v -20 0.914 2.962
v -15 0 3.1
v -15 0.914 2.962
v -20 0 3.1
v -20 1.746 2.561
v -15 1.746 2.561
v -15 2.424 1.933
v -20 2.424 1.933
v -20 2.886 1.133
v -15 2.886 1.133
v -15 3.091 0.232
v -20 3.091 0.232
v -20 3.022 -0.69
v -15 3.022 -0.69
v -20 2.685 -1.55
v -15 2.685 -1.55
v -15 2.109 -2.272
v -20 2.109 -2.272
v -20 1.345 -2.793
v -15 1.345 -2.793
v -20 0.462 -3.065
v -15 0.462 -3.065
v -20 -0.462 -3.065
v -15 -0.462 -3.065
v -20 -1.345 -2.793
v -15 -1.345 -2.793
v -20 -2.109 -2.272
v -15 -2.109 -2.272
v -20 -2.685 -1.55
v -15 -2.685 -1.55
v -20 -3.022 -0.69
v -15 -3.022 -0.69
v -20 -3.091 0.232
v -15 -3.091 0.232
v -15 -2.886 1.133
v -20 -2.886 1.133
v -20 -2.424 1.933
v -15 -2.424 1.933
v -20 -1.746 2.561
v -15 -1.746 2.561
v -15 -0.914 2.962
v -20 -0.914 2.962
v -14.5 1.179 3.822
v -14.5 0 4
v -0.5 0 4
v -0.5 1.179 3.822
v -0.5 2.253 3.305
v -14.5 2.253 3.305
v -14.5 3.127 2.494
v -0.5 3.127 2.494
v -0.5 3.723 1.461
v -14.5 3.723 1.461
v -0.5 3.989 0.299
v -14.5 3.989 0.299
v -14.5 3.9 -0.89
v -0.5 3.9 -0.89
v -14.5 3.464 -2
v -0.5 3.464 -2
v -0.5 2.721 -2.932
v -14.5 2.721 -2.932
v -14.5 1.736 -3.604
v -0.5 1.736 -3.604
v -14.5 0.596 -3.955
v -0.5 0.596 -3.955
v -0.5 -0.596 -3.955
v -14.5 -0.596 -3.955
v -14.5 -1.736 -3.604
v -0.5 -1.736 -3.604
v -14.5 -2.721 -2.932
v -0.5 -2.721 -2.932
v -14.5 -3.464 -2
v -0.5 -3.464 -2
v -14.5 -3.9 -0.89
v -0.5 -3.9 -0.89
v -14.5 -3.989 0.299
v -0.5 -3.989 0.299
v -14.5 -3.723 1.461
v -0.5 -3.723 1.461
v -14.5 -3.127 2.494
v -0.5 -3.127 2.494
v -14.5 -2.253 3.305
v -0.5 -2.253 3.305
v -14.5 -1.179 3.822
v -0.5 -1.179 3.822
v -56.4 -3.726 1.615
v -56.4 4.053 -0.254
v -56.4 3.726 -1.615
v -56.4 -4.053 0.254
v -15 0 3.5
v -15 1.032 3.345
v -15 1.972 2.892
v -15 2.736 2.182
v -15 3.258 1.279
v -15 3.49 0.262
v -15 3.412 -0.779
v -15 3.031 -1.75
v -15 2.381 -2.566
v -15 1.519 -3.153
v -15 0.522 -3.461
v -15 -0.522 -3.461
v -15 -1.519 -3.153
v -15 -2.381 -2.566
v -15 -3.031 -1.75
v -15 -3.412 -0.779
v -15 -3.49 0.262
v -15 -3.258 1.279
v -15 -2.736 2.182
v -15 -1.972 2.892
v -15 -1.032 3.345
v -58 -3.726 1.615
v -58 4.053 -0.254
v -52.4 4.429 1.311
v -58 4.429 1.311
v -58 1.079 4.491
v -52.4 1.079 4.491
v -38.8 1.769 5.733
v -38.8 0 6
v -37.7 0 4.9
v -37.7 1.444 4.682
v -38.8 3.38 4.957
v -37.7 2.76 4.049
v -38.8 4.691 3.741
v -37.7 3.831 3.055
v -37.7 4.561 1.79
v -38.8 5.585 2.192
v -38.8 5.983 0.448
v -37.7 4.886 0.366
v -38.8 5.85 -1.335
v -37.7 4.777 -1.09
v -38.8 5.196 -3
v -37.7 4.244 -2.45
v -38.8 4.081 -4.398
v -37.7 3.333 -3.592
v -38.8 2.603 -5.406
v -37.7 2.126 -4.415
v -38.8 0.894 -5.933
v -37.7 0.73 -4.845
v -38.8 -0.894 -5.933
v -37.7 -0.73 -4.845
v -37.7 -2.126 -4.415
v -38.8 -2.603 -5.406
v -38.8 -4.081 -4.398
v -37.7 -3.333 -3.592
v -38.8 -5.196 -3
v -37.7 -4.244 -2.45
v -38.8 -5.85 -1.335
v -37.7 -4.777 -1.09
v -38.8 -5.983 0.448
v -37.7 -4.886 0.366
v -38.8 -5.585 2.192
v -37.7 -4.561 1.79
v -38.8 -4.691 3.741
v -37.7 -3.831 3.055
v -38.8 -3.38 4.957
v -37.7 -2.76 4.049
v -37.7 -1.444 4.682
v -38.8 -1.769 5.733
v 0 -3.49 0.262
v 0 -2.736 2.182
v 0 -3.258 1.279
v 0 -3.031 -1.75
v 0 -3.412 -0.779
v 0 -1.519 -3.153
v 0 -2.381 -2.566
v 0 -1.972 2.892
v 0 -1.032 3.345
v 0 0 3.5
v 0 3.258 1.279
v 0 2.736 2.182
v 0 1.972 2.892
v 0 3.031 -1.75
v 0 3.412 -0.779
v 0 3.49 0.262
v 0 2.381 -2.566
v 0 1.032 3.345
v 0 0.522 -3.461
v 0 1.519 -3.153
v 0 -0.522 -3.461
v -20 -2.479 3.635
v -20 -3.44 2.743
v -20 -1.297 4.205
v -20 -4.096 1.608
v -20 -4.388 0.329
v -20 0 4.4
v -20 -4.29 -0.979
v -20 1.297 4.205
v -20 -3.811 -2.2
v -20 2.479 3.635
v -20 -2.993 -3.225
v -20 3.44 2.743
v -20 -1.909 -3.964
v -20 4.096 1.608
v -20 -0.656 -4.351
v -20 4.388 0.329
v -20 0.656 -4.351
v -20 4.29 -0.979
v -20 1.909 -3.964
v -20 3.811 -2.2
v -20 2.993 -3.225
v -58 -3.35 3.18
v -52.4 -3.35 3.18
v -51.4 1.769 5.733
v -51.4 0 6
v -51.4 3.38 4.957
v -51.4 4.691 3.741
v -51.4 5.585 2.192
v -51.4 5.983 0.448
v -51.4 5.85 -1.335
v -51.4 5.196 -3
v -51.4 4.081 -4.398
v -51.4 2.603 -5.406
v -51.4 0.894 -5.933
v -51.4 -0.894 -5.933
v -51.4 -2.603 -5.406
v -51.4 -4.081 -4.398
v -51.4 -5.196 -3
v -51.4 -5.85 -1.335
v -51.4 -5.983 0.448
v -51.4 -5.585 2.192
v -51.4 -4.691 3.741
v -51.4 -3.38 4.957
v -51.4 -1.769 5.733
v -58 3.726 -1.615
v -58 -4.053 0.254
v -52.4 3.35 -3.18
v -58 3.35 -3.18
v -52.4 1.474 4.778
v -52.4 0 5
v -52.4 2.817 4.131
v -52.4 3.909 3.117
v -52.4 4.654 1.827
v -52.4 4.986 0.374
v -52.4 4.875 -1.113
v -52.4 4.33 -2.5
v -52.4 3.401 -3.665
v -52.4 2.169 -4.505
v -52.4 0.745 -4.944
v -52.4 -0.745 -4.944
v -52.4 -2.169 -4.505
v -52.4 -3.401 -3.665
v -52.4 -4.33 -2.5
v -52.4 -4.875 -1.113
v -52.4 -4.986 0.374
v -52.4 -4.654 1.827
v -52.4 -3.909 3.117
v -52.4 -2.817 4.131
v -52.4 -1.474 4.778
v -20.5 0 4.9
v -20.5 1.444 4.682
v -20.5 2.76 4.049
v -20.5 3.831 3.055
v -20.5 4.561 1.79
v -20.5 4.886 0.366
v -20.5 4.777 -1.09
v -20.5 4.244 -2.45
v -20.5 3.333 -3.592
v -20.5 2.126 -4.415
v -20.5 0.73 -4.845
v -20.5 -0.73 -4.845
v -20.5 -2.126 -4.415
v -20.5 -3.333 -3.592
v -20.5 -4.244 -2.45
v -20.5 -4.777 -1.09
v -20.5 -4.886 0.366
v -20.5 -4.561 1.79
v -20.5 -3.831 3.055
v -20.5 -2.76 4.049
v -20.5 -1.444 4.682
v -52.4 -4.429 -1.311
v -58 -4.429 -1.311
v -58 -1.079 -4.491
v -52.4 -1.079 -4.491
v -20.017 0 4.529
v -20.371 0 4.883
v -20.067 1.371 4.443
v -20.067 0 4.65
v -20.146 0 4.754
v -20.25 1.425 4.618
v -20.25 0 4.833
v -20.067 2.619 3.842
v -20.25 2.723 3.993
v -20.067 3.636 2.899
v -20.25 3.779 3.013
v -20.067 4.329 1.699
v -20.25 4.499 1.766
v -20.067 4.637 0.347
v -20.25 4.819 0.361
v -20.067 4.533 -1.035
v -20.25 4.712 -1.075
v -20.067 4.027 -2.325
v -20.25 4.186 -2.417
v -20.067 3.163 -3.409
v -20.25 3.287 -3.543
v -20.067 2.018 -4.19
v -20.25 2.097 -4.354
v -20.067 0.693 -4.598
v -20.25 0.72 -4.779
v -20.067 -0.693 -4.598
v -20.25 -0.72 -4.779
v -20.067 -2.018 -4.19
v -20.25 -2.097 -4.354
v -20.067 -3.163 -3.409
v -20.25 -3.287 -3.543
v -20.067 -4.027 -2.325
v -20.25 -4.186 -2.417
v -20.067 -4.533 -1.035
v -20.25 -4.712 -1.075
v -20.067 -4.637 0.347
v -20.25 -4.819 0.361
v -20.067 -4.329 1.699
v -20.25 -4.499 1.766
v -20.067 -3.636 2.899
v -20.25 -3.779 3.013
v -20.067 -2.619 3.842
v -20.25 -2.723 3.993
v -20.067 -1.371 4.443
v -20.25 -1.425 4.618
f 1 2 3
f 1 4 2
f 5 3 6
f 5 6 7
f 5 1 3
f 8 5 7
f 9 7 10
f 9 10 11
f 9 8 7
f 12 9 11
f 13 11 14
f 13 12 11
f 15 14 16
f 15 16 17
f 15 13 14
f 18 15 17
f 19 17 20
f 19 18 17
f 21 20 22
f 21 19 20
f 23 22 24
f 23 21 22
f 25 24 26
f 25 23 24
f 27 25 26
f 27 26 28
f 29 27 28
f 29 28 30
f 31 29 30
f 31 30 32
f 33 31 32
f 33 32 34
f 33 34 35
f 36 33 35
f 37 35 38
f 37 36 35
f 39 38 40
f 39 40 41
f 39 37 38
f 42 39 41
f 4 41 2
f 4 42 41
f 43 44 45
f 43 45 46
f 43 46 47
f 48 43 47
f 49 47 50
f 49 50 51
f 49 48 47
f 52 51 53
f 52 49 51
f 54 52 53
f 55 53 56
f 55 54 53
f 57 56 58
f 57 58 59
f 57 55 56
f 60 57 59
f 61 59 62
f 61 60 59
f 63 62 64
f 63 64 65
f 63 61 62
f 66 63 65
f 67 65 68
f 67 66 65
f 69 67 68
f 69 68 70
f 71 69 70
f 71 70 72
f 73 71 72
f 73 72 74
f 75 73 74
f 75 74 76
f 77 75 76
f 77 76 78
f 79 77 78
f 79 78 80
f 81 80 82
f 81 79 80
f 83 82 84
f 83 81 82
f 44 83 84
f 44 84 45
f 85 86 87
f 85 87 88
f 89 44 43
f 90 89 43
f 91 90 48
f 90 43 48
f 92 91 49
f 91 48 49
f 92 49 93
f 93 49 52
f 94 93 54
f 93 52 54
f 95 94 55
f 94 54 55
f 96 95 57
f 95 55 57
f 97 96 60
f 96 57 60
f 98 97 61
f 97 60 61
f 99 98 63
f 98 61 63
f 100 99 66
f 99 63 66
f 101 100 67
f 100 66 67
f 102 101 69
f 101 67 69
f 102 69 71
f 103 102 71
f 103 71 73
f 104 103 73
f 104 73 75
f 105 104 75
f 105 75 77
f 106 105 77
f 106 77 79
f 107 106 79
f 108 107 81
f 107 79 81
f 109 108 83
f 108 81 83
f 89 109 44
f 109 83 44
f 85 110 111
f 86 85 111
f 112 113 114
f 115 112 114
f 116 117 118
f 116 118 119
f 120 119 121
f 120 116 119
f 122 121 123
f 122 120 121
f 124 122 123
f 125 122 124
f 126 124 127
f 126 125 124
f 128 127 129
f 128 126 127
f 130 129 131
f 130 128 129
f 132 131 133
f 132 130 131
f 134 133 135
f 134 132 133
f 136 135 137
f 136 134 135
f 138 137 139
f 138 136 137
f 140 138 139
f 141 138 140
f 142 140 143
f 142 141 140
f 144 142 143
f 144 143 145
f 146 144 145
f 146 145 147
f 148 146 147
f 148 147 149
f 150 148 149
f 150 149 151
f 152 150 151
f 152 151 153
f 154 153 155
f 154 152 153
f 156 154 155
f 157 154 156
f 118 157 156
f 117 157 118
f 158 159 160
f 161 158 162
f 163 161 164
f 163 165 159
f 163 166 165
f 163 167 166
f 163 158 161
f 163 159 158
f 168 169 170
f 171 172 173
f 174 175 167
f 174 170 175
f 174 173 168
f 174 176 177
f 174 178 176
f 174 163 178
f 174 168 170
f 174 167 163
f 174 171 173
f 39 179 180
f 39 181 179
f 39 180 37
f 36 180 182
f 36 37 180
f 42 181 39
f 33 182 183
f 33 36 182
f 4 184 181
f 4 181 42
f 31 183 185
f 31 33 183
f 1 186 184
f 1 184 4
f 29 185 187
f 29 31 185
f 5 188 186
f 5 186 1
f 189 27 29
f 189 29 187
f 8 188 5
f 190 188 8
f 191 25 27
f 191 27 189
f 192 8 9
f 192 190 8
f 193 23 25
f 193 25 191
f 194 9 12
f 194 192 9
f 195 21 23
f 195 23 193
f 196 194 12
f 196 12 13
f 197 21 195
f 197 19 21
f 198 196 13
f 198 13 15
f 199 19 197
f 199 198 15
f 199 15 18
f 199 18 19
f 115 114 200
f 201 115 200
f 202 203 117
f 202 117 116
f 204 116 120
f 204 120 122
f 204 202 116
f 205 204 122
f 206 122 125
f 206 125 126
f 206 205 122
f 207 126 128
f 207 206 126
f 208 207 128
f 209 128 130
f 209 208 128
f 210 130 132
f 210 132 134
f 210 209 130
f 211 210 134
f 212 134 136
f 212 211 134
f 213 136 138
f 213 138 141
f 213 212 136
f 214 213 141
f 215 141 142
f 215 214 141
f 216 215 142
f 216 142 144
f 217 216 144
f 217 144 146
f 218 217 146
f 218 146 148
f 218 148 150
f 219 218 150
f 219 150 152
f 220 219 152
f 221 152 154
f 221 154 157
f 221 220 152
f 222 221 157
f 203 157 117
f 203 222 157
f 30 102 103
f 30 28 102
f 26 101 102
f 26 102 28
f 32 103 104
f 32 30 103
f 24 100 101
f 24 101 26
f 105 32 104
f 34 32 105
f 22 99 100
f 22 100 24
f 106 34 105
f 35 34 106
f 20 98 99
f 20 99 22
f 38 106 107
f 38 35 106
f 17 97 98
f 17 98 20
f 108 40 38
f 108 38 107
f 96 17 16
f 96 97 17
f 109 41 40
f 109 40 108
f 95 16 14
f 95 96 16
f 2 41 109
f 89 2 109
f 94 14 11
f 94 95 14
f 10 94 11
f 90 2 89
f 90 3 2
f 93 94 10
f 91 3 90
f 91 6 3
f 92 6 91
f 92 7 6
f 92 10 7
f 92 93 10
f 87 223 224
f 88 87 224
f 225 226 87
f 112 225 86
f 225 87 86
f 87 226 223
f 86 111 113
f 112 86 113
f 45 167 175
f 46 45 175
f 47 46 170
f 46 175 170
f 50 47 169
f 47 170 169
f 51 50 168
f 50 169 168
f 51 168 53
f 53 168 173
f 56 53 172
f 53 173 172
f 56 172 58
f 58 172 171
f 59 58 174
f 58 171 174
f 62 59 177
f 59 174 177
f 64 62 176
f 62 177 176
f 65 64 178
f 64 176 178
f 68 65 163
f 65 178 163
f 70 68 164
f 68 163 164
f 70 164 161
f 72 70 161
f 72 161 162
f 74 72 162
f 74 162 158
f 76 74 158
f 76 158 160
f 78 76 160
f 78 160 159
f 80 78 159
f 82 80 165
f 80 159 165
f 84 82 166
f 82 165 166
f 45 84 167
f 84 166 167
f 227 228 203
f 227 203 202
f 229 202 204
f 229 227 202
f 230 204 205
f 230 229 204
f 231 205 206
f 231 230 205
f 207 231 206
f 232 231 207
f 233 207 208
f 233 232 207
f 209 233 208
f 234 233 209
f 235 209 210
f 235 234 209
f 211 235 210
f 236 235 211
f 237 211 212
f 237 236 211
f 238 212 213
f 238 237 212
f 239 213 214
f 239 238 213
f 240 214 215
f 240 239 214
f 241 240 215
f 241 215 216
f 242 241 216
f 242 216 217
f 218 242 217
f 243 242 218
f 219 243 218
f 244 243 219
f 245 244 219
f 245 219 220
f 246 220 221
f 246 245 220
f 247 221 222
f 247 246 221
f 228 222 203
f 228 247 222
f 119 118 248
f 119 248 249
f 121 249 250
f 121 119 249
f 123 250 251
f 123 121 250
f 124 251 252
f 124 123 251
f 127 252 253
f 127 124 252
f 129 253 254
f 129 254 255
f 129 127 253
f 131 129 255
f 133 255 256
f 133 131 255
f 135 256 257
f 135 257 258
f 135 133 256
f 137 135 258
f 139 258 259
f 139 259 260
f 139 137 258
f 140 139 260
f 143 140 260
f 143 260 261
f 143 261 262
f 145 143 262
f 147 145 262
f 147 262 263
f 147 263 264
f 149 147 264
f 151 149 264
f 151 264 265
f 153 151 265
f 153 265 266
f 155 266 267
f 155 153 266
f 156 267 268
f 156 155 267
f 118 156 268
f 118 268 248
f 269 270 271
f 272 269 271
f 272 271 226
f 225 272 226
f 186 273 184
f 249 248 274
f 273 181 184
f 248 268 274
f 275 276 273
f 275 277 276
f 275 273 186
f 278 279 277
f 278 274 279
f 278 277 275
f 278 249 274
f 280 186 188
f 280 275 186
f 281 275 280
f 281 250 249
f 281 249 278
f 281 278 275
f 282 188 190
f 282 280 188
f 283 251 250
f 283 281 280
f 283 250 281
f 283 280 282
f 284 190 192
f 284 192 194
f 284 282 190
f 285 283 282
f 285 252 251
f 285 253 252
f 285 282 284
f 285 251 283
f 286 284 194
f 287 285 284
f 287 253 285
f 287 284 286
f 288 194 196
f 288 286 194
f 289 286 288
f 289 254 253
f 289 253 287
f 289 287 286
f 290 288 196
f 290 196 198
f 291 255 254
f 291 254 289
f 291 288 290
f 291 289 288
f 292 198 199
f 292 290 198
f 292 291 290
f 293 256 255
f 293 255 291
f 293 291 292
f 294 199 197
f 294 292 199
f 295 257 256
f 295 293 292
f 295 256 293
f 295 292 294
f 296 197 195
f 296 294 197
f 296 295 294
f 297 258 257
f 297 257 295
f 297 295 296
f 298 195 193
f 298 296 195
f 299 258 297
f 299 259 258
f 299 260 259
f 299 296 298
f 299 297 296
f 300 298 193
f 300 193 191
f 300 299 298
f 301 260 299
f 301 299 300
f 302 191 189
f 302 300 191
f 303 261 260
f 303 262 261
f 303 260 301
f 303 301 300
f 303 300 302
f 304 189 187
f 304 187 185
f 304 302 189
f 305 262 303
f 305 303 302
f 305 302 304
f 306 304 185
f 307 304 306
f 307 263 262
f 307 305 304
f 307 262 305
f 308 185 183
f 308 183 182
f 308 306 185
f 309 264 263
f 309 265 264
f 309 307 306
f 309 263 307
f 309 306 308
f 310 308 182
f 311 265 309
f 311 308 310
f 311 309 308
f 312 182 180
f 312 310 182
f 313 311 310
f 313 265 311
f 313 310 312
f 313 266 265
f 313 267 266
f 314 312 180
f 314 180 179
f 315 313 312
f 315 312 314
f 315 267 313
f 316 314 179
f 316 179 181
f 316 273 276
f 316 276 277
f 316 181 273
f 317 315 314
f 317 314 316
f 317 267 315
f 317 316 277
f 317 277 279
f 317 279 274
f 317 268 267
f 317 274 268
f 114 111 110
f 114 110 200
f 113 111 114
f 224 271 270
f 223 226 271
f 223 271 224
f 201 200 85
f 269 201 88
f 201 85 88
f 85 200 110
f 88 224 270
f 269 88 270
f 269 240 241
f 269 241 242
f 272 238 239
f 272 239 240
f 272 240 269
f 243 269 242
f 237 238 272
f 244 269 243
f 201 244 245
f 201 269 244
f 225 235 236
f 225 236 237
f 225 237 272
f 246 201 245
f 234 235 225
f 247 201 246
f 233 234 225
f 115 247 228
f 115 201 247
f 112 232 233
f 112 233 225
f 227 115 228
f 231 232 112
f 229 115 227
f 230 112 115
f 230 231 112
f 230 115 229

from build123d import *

# Parameters (mm, degrees)
F2_R     = 8.471957502
F3_DEPTH = 5.6
F4_SIZE  = 1.09999
F5_SIZE  = 1
F6_SIZE  = 0.5
F7_R     = 0.5
F9_DEPTH = 1.6


# Not quite as in the source:
# - a fillet or chamfer is up to 0.001 mm smaller than in the source, because OpenCascade refuses the exact size


with BuildPart() as f1:
    # F0 (on Front) → F1 (revolve)
    with BuildSketch(Plane.XZ):
        Polygon((-58, 0), (0, 0), (0, 4), (-15, 4), (-15, 3.1), (-20, 3.1), (-20, 4.9), (-37.7, 4.9), (-37.7, 6), (-52.4, 6), (-52.4, 5), (-58, 5), align=None)
    revolve(axis=Axis((-31.3887451561, 0, 0), (-1, 0, 0)))

    # F2 (on face) → F3 (cut, through all)
    with BuildSketch(Plane(origin=(-58, 0, 0), x_dir=(0, -1, 0), z_dir=(-1, 0, 0))):
        Circle(F2_R)
        Polygon((-1.0790139268, 4.4909979157), (3.34981132, 3.1799524295), (4.4288252468, -1.3110454863), (1.0790139268, -4.4909979157), (-3.34981132, -3.1799524295), (-4.4288252468, 1.3110454863), align=None, mode=Mode.SUBTRACT)
    extrude(amount=-F3_DEPTH, mode=Mode.SUBTRACT)

    # F4 (size 1.1 in the source; OpenCascade refuses exactly that, so slightly less here)
    f4_edges = [f1.edges().sort_by_distance(p)[0] for p in [
        (-37.7, 0, -6),
    ]]
    chamfer(f4_edges, length=F4_SIZE)

    # F5
    f5_edges = [f1.edges().sort_by_distance(p)[0] for p in [
        (-52.4, 0, -6),
    ]]
    chamfer(f5_edges, length=F5_SIZE)

    # F6
    f6_edges = [f1.edges().sort_by_distance(p)[0] for p in [
        (0, 0, -4),
        (-15, 0, -4),
    ]]
    chamfer(f6_edges, length=F6_SIZE)

    # F7
    f7_edges = [f1.edges().sort_by_distance(p)[0] for p in [
        (-20, 0, -4.9),
    ]]
    fillet(f7_edges, radius=F7_R)

    # F8 (on face) → F9 (cut)
    with BuildSketch(Plane(origin=(-58, 0, 0), x_dir=(0, -1, 0), z_dir=(-1, 0, 0))):
        Polygon((-4.0528476409, -0.253822772), (-3.7257889258, -1.6150841712), (4.0528476409, 0.253822772), (3.7257889258, 1.6150841712), align=None)
    extrude(amount=-F9_DEPTH, mode=Mode.SUBTRACT)


solid = f1.part
